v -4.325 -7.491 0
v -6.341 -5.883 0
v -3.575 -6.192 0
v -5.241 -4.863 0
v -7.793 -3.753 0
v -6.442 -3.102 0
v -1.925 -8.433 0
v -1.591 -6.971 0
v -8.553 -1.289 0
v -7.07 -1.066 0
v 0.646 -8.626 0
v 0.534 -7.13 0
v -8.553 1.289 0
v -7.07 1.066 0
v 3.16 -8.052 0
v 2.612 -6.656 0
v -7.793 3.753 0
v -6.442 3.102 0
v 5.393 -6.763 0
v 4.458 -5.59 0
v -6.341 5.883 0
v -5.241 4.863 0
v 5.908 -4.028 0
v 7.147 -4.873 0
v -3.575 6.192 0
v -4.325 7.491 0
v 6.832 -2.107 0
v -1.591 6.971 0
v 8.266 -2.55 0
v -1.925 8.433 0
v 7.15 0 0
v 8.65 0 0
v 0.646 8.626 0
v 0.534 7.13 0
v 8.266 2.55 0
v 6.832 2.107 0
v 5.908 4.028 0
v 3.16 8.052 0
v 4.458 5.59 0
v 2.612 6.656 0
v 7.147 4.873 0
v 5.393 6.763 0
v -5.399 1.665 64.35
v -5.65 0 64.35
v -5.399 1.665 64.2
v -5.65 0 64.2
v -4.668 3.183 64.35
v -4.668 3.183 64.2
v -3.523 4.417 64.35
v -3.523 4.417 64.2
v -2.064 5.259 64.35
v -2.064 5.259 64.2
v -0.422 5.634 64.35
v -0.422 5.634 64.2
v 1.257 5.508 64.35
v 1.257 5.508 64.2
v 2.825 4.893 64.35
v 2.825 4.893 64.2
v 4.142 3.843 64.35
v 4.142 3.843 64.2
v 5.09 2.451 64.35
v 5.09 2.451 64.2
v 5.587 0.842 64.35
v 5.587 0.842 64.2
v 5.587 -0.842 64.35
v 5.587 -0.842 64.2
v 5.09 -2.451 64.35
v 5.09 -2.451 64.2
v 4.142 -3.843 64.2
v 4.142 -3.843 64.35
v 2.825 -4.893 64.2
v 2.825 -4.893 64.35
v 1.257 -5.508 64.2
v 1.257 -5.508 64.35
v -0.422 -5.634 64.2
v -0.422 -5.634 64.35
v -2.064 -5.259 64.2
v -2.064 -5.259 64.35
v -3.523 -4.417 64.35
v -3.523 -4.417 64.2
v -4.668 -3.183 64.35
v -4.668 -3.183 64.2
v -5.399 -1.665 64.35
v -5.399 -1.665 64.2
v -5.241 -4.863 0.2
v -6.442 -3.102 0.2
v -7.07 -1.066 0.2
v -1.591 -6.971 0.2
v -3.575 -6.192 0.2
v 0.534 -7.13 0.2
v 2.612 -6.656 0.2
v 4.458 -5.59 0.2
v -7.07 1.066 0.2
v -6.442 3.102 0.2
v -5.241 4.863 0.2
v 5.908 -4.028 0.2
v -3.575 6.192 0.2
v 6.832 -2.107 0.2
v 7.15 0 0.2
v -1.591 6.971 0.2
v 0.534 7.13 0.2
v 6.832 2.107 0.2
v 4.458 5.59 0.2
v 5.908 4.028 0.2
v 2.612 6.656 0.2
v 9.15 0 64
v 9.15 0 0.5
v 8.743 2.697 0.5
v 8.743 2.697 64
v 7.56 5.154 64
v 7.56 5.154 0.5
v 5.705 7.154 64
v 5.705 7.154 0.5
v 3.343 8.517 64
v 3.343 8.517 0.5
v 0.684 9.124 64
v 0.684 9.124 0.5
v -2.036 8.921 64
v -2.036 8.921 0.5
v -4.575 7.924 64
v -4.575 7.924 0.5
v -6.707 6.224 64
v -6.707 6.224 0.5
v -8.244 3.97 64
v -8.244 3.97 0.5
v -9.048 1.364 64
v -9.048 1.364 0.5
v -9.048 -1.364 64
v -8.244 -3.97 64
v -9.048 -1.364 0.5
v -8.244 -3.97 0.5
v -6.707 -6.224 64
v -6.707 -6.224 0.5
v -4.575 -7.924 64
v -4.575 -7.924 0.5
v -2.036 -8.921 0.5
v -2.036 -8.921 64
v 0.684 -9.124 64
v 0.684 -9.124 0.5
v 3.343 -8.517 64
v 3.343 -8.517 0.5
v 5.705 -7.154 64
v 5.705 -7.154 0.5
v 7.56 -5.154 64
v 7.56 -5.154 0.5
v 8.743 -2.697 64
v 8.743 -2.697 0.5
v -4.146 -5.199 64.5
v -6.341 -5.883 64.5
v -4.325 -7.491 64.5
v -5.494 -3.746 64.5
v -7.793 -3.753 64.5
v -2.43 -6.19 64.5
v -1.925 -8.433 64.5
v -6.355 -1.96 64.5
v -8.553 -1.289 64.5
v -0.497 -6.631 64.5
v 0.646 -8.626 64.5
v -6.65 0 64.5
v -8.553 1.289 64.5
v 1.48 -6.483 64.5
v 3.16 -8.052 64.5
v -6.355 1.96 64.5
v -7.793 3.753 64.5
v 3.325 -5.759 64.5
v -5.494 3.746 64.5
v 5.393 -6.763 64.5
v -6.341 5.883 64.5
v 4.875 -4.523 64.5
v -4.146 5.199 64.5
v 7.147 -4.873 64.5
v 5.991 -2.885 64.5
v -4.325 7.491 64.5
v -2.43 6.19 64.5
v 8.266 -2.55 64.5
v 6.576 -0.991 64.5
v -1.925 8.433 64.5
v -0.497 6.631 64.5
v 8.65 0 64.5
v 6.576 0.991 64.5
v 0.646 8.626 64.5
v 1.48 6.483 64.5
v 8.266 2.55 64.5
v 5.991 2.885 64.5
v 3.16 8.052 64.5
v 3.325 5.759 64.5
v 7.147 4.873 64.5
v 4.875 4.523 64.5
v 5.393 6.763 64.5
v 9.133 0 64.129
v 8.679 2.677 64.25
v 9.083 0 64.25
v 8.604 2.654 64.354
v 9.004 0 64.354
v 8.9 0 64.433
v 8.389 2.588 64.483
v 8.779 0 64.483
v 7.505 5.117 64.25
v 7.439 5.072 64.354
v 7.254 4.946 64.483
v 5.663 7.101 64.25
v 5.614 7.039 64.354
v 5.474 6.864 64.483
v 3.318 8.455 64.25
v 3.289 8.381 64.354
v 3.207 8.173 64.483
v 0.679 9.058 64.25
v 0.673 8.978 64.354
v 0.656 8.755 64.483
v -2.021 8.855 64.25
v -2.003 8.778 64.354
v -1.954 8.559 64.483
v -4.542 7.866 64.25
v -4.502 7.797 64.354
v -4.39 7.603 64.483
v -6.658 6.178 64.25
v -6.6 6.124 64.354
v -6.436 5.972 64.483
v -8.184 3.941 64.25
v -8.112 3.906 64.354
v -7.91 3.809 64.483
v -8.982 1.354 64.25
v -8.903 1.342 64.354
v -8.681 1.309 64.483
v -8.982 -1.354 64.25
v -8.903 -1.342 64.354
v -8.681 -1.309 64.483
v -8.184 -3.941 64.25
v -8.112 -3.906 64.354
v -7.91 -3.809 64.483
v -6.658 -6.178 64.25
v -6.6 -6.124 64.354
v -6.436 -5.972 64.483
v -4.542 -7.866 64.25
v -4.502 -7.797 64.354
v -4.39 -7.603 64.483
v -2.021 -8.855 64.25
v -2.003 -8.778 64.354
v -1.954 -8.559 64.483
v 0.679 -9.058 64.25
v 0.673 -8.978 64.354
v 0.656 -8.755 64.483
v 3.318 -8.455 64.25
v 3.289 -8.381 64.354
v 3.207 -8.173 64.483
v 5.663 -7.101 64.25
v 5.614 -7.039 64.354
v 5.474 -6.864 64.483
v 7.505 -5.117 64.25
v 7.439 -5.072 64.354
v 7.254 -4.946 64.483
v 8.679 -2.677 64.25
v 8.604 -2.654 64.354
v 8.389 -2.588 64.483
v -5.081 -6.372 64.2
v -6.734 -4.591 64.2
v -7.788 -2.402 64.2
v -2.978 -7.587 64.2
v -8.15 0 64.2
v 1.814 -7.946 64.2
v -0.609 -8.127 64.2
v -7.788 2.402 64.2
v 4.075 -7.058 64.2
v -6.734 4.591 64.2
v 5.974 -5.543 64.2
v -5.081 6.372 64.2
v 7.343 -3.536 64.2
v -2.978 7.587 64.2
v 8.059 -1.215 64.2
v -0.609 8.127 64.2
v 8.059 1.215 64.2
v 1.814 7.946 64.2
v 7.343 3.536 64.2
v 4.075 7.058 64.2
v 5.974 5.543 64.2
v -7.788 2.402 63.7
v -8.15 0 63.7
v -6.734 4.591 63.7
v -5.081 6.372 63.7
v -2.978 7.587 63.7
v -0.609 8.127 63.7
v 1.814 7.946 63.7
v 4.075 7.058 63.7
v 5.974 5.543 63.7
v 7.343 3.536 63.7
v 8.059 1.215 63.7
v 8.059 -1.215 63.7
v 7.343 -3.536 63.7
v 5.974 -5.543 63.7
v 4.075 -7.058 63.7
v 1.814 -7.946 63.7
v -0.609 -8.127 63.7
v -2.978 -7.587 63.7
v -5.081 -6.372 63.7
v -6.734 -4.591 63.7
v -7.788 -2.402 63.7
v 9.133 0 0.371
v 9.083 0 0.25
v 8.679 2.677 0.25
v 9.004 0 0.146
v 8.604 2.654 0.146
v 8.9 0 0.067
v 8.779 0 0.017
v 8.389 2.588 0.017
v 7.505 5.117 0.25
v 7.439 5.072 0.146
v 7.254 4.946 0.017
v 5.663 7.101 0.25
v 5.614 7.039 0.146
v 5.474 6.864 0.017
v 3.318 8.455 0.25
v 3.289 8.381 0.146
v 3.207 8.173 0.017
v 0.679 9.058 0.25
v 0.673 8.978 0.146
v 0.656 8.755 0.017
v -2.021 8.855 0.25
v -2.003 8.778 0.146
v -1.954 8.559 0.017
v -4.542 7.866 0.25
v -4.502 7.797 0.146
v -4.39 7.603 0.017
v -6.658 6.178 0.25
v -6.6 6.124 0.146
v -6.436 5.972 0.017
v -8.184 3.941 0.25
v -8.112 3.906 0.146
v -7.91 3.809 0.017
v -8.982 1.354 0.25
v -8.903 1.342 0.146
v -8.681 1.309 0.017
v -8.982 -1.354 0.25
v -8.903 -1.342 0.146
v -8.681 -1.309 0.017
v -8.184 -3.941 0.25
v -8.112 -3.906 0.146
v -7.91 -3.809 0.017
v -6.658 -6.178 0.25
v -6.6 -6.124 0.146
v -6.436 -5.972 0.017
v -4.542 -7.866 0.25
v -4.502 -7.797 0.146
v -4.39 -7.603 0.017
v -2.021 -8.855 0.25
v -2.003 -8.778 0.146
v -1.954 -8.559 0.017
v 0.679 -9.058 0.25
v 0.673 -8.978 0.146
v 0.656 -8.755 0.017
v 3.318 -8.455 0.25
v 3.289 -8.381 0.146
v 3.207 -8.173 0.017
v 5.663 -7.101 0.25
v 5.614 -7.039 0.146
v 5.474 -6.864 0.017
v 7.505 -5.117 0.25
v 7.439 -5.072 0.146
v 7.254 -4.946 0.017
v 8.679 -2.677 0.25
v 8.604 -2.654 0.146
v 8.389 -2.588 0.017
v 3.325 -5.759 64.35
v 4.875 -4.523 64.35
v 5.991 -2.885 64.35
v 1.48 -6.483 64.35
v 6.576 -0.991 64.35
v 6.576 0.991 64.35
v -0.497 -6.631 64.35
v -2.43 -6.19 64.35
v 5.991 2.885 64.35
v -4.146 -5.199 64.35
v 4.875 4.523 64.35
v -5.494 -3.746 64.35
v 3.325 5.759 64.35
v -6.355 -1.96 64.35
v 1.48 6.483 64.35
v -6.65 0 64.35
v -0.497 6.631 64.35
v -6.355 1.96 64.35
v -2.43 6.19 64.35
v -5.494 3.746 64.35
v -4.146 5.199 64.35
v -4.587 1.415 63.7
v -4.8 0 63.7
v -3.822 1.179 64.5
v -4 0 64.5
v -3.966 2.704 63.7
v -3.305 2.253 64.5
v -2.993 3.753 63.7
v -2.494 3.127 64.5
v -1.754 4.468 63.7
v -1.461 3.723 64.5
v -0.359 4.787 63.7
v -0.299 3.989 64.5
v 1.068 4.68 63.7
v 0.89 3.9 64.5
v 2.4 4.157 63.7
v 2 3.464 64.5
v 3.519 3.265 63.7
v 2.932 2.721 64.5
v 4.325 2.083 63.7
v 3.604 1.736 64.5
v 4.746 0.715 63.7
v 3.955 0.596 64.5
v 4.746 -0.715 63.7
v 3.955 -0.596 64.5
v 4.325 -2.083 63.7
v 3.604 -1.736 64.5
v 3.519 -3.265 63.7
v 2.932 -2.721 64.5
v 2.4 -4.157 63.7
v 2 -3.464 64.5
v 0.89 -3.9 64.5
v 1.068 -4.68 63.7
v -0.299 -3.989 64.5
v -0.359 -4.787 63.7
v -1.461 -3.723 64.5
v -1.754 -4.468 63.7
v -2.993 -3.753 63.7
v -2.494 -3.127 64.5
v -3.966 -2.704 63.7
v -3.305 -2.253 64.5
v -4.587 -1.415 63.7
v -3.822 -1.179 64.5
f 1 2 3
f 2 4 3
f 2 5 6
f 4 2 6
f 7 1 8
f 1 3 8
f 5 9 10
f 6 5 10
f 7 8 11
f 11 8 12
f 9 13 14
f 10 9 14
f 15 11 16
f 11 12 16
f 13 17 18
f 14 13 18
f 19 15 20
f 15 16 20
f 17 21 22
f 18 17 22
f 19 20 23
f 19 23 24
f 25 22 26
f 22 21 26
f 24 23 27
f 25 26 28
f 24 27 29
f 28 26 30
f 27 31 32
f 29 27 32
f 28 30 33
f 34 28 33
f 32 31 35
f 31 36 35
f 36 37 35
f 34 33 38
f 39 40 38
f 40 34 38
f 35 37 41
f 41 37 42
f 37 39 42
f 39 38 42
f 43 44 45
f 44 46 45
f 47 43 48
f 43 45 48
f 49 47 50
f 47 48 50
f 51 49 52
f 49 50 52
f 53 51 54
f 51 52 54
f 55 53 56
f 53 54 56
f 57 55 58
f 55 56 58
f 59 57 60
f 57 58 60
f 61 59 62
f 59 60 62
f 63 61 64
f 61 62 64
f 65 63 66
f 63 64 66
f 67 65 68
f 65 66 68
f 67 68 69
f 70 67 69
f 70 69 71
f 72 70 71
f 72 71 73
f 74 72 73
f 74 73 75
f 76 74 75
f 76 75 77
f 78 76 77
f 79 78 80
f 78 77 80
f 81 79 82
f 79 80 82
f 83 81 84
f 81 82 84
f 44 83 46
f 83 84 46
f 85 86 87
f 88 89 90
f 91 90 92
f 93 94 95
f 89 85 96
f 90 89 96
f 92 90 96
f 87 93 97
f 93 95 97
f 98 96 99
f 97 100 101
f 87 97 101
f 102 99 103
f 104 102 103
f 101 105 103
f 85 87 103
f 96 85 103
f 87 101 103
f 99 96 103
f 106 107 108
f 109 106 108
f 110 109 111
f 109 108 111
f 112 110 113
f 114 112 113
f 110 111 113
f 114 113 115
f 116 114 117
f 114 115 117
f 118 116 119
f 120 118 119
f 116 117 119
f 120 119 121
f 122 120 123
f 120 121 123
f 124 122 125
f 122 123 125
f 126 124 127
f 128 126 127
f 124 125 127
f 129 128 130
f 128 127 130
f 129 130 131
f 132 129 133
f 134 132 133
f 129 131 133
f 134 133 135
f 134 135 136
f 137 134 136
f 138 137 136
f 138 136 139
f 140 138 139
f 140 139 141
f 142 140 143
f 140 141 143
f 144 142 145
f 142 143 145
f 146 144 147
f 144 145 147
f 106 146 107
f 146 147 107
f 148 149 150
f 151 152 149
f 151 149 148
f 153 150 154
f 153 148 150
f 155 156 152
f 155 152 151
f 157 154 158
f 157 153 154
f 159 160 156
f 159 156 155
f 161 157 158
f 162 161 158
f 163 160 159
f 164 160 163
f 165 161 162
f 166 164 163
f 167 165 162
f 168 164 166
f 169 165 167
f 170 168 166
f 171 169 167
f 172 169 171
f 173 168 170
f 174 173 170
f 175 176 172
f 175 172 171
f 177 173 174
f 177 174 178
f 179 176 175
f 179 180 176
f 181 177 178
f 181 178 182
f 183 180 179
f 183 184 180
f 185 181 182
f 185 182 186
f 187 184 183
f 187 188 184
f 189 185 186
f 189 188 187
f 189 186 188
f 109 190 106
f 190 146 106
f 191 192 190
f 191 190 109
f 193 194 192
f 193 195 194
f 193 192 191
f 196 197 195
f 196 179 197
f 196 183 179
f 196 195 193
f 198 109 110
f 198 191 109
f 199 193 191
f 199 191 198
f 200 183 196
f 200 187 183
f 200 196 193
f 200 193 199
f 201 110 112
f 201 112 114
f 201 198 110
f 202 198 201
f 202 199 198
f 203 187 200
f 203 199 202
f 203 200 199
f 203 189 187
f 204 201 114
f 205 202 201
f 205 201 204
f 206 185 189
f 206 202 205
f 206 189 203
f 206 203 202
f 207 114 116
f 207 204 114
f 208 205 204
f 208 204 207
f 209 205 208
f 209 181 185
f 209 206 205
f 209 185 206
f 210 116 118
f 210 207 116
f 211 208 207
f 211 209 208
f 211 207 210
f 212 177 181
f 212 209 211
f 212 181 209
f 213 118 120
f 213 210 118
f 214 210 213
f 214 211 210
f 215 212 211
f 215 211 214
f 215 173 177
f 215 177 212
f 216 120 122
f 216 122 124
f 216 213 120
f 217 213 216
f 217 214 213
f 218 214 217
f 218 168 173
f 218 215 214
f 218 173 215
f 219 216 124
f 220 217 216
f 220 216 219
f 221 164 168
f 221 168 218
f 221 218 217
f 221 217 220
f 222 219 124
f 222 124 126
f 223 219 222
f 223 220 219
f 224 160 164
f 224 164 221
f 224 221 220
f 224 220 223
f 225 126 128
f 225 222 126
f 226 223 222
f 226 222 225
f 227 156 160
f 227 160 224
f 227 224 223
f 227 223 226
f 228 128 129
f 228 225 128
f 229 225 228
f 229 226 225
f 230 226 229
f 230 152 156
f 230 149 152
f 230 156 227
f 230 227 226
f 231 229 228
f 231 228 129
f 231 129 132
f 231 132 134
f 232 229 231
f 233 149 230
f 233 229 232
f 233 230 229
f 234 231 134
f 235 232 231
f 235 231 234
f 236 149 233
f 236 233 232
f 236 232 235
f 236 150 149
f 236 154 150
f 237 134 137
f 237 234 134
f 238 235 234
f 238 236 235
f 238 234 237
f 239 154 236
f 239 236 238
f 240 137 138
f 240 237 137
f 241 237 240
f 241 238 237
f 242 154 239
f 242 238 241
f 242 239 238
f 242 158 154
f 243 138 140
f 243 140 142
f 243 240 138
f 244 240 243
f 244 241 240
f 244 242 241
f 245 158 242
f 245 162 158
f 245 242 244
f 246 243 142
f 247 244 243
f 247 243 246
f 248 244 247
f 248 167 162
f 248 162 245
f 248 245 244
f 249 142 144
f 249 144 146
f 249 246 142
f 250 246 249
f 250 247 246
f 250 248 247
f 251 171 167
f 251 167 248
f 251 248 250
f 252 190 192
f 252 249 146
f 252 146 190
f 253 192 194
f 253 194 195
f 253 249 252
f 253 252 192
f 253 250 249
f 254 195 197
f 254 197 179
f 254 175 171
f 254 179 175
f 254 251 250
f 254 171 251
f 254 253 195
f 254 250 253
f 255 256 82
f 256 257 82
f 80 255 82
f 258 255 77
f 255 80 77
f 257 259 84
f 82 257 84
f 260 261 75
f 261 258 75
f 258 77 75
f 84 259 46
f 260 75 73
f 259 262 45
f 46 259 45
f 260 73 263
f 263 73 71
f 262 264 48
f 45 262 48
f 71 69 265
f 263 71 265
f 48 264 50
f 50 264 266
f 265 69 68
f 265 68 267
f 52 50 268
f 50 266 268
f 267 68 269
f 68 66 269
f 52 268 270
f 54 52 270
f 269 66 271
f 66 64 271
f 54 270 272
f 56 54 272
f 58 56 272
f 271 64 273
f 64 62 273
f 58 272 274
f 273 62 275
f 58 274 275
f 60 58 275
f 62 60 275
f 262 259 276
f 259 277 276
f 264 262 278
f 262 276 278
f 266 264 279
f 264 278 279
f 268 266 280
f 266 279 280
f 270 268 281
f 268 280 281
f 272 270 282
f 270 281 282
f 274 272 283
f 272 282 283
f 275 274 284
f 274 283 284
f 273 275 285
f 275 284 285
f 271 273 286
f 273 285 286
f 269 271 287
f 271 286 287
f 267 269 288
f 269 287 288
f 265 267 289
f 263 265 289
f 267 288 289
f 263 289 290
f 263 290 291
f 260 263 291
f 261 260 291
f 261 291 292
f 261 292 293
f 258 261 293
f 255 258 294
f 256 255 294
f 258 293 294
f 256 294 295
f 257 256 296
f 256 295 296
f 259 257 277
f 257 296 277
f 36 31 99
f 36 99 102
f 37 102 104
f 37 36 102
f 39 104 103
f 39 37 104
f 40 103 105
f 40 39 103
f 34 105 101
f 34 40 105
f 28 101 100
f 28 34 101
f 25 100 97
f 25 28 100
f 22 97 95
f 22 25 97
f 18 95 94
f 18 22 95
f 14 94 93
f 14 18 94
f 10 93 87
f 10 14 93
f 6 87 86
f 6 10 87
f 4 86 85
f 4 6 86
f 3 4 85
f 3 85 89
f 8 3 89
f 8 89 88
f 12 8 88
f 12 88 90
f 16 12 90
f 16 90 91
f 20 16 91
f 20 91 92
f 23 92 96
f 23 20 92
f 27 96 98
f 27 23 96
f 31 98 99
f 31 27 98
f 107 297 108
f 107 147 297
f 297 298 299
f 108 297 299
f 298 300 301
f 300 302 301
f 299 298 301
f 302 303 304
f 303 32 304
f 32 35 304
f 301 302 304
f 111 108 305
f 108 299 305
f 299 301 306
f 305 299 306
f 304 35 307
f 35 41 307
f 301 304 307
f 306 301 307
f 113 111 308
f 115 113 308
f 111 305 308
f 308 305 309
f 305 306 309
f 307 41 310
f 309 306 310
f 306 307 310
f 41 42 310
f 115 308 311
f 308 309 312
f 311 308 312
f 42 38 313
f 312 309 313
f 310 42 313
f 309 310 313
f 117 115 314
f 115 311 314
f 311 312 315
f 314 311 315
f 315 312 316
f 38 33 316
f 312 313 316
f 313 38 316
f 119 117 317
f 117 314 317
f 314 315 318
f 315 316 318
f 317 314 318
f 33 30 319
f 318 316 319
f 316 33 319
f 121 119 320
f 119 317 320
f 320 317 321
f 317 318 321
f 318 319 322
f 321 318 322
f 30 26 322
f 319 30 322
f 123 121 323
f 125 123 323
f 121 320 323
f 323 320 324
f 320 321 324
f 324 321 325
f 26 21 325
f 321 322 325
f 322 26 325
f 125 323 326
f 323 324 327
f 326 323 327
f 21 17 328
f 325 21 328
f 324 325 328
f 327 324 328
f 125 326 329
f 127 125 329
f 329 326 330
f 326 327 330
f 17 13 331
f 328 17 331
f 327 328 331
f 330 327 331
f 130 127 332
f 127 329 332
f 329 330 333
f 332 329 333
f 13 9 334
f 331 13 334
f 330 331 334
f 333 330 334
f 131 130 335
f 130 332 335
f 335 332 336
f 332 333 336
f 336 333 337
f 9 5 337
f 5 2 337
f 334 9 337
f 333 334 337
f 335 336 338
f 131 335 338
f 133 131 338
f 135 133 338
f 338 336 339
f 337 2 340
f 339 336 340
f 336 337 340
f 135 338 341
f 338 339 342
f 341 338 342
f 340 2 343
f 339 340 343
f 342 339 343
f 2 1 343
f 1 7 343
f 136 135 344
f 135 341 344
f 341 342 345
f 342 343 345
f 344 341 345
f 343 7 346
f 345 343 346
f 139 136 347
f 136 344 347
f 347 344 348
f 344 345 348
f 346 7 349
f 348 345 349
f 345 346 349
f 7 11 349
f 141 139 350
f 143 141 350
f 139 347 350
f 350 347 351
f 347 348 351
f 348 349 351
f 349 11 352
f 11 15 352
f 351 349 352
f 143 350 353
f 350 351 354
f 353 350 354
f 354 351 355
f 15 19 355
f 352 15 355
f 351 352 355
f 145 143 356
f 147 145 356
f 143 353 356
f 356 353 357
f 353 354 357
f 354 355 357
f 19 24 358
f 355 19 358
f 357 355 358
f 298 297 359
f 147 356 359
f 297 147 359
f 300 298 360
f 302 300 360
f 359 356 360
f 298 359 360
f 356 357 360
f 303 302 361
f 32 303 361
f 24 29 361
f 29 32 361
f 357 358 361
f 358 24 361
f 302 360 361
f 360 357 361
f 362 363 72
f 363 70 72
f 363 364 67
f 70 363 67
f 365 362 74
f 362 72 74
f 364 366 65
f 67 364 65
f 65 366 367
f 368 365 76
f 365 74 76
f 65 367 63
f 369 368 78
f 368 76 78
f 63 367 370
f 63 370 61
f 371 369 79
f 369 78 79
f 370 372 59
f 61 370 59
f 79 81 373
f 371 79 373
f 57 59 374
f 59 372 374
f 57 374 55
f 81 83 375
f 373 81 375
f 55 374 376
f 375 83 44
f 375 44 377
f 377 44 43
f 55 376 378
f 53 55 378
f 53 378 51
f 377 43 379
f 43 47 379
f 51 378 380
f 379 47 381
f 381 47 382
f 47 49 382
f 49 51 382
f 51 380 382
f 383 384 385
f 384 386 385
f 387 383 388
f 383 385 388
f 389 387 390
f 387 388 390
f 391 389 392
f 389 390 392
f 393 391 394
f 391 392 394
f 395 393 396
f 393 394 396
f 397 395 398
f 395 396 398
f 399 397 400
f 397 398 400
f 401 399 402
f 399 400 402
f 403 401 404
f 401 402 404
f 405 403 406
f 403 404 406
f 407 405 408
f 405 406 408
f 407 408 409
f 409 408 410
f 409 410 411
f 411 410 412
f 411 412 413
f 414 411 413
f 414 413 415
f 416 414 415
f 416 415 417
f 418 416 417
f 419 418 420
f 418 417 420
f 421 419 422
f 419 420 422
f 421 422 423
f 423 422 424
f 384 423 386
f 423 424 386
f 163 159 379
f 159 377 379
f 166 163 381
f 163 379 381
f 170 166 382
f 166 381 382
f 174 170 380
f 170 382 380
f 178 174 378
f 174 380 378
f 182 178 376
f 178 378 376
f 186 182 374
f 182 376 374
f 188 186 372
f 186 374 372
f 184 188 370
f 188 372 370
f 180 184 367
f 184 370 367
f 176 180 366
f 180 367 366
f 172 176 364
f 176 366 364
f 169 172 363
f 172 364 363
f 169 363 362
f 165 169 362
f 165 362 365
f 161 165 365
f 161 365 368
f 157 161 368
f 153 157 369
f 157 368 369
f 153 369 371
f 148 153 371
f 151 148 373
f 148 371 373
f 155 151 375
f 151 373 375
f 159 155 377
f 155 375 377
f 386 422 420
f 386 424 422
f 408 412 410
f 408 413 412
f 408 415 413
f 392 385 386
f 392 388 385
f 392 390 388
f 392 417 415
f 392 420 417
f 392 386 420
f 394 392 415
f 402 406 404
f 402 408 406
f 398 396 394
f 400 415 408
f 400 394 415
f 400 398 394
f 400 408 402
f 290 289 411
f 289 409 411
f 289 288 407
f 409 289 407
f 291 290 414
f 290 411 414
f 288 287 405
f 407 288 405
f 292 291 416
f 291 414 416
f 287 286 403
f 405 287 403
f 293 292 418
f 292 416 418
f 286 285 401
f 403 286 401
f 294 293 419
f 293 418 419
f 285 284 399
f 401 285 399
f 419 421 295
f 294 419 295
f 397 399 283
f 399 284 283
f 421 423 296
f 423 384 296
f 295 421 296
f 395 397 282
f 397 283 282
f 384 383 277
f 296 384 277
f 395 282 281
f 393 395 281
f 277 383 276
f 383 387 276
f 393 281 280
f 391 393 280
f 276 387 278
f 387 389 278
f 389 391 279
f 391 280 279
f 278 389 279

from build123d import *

# Parameters (mm, degrees)
SKETCH1_R           = 9.149999998
BOSS_EXTRUDE1_DEPTH = 64.5
SKETCH2_R           = 7.15
CUT_EXTRUDE1_DEPTH  = 0.2
FILLET1_R           = 0.5


with BuildPart() as part:
    # Sketch1 → Boss-Extrude1 (new body)
    with BuildSketch(Plane.XY):
        Circle(SKETCH1_R)
    extrude(amount=BOSS_EXTRUDE1_DEPTH)

    # Sketch2 → Cut-Extrude1 (cut)
    with BuildSketch(Plane.XY):
        Circle(SKETCH2_R)
    extrude(amount=CUT_EXTRUDE1_DEPTH, mode=Mode.SUBTRACT)

    # Sketch3 → Cut-Revolve1 (revolve, cut)
    with BuildSketch(Plane(origin=(0, 0, 0), x_dir=(1, 0, 0), z_dir=(0, 1, 0))):
        Polygon((-8.149999999, -64.2), (-8.149999999, -63.700000001), (-4.799999999, -63.700000001), (-3.999999999, -64.5), (-6.650000001, -64.5), (-6.650000001, -64.35), (-5.649999999, -64.35), (-5.649999999, -64.2), align=None)
    revolve(axis=Axis((0, 0, 64.835920194), (0, 0, -1)), mode=Mode.SUBTRACT)

    # Fillet1
    fillet1_edges = [part.edges().sort_by_distance(p)[0] for p in [
        (-9.149999998, 0, 0),
        (-9.149999998, 0, 64.5),
    ]]
    fillet(fillet1_edges, radius=FILLET1_R)


solid = part.part
